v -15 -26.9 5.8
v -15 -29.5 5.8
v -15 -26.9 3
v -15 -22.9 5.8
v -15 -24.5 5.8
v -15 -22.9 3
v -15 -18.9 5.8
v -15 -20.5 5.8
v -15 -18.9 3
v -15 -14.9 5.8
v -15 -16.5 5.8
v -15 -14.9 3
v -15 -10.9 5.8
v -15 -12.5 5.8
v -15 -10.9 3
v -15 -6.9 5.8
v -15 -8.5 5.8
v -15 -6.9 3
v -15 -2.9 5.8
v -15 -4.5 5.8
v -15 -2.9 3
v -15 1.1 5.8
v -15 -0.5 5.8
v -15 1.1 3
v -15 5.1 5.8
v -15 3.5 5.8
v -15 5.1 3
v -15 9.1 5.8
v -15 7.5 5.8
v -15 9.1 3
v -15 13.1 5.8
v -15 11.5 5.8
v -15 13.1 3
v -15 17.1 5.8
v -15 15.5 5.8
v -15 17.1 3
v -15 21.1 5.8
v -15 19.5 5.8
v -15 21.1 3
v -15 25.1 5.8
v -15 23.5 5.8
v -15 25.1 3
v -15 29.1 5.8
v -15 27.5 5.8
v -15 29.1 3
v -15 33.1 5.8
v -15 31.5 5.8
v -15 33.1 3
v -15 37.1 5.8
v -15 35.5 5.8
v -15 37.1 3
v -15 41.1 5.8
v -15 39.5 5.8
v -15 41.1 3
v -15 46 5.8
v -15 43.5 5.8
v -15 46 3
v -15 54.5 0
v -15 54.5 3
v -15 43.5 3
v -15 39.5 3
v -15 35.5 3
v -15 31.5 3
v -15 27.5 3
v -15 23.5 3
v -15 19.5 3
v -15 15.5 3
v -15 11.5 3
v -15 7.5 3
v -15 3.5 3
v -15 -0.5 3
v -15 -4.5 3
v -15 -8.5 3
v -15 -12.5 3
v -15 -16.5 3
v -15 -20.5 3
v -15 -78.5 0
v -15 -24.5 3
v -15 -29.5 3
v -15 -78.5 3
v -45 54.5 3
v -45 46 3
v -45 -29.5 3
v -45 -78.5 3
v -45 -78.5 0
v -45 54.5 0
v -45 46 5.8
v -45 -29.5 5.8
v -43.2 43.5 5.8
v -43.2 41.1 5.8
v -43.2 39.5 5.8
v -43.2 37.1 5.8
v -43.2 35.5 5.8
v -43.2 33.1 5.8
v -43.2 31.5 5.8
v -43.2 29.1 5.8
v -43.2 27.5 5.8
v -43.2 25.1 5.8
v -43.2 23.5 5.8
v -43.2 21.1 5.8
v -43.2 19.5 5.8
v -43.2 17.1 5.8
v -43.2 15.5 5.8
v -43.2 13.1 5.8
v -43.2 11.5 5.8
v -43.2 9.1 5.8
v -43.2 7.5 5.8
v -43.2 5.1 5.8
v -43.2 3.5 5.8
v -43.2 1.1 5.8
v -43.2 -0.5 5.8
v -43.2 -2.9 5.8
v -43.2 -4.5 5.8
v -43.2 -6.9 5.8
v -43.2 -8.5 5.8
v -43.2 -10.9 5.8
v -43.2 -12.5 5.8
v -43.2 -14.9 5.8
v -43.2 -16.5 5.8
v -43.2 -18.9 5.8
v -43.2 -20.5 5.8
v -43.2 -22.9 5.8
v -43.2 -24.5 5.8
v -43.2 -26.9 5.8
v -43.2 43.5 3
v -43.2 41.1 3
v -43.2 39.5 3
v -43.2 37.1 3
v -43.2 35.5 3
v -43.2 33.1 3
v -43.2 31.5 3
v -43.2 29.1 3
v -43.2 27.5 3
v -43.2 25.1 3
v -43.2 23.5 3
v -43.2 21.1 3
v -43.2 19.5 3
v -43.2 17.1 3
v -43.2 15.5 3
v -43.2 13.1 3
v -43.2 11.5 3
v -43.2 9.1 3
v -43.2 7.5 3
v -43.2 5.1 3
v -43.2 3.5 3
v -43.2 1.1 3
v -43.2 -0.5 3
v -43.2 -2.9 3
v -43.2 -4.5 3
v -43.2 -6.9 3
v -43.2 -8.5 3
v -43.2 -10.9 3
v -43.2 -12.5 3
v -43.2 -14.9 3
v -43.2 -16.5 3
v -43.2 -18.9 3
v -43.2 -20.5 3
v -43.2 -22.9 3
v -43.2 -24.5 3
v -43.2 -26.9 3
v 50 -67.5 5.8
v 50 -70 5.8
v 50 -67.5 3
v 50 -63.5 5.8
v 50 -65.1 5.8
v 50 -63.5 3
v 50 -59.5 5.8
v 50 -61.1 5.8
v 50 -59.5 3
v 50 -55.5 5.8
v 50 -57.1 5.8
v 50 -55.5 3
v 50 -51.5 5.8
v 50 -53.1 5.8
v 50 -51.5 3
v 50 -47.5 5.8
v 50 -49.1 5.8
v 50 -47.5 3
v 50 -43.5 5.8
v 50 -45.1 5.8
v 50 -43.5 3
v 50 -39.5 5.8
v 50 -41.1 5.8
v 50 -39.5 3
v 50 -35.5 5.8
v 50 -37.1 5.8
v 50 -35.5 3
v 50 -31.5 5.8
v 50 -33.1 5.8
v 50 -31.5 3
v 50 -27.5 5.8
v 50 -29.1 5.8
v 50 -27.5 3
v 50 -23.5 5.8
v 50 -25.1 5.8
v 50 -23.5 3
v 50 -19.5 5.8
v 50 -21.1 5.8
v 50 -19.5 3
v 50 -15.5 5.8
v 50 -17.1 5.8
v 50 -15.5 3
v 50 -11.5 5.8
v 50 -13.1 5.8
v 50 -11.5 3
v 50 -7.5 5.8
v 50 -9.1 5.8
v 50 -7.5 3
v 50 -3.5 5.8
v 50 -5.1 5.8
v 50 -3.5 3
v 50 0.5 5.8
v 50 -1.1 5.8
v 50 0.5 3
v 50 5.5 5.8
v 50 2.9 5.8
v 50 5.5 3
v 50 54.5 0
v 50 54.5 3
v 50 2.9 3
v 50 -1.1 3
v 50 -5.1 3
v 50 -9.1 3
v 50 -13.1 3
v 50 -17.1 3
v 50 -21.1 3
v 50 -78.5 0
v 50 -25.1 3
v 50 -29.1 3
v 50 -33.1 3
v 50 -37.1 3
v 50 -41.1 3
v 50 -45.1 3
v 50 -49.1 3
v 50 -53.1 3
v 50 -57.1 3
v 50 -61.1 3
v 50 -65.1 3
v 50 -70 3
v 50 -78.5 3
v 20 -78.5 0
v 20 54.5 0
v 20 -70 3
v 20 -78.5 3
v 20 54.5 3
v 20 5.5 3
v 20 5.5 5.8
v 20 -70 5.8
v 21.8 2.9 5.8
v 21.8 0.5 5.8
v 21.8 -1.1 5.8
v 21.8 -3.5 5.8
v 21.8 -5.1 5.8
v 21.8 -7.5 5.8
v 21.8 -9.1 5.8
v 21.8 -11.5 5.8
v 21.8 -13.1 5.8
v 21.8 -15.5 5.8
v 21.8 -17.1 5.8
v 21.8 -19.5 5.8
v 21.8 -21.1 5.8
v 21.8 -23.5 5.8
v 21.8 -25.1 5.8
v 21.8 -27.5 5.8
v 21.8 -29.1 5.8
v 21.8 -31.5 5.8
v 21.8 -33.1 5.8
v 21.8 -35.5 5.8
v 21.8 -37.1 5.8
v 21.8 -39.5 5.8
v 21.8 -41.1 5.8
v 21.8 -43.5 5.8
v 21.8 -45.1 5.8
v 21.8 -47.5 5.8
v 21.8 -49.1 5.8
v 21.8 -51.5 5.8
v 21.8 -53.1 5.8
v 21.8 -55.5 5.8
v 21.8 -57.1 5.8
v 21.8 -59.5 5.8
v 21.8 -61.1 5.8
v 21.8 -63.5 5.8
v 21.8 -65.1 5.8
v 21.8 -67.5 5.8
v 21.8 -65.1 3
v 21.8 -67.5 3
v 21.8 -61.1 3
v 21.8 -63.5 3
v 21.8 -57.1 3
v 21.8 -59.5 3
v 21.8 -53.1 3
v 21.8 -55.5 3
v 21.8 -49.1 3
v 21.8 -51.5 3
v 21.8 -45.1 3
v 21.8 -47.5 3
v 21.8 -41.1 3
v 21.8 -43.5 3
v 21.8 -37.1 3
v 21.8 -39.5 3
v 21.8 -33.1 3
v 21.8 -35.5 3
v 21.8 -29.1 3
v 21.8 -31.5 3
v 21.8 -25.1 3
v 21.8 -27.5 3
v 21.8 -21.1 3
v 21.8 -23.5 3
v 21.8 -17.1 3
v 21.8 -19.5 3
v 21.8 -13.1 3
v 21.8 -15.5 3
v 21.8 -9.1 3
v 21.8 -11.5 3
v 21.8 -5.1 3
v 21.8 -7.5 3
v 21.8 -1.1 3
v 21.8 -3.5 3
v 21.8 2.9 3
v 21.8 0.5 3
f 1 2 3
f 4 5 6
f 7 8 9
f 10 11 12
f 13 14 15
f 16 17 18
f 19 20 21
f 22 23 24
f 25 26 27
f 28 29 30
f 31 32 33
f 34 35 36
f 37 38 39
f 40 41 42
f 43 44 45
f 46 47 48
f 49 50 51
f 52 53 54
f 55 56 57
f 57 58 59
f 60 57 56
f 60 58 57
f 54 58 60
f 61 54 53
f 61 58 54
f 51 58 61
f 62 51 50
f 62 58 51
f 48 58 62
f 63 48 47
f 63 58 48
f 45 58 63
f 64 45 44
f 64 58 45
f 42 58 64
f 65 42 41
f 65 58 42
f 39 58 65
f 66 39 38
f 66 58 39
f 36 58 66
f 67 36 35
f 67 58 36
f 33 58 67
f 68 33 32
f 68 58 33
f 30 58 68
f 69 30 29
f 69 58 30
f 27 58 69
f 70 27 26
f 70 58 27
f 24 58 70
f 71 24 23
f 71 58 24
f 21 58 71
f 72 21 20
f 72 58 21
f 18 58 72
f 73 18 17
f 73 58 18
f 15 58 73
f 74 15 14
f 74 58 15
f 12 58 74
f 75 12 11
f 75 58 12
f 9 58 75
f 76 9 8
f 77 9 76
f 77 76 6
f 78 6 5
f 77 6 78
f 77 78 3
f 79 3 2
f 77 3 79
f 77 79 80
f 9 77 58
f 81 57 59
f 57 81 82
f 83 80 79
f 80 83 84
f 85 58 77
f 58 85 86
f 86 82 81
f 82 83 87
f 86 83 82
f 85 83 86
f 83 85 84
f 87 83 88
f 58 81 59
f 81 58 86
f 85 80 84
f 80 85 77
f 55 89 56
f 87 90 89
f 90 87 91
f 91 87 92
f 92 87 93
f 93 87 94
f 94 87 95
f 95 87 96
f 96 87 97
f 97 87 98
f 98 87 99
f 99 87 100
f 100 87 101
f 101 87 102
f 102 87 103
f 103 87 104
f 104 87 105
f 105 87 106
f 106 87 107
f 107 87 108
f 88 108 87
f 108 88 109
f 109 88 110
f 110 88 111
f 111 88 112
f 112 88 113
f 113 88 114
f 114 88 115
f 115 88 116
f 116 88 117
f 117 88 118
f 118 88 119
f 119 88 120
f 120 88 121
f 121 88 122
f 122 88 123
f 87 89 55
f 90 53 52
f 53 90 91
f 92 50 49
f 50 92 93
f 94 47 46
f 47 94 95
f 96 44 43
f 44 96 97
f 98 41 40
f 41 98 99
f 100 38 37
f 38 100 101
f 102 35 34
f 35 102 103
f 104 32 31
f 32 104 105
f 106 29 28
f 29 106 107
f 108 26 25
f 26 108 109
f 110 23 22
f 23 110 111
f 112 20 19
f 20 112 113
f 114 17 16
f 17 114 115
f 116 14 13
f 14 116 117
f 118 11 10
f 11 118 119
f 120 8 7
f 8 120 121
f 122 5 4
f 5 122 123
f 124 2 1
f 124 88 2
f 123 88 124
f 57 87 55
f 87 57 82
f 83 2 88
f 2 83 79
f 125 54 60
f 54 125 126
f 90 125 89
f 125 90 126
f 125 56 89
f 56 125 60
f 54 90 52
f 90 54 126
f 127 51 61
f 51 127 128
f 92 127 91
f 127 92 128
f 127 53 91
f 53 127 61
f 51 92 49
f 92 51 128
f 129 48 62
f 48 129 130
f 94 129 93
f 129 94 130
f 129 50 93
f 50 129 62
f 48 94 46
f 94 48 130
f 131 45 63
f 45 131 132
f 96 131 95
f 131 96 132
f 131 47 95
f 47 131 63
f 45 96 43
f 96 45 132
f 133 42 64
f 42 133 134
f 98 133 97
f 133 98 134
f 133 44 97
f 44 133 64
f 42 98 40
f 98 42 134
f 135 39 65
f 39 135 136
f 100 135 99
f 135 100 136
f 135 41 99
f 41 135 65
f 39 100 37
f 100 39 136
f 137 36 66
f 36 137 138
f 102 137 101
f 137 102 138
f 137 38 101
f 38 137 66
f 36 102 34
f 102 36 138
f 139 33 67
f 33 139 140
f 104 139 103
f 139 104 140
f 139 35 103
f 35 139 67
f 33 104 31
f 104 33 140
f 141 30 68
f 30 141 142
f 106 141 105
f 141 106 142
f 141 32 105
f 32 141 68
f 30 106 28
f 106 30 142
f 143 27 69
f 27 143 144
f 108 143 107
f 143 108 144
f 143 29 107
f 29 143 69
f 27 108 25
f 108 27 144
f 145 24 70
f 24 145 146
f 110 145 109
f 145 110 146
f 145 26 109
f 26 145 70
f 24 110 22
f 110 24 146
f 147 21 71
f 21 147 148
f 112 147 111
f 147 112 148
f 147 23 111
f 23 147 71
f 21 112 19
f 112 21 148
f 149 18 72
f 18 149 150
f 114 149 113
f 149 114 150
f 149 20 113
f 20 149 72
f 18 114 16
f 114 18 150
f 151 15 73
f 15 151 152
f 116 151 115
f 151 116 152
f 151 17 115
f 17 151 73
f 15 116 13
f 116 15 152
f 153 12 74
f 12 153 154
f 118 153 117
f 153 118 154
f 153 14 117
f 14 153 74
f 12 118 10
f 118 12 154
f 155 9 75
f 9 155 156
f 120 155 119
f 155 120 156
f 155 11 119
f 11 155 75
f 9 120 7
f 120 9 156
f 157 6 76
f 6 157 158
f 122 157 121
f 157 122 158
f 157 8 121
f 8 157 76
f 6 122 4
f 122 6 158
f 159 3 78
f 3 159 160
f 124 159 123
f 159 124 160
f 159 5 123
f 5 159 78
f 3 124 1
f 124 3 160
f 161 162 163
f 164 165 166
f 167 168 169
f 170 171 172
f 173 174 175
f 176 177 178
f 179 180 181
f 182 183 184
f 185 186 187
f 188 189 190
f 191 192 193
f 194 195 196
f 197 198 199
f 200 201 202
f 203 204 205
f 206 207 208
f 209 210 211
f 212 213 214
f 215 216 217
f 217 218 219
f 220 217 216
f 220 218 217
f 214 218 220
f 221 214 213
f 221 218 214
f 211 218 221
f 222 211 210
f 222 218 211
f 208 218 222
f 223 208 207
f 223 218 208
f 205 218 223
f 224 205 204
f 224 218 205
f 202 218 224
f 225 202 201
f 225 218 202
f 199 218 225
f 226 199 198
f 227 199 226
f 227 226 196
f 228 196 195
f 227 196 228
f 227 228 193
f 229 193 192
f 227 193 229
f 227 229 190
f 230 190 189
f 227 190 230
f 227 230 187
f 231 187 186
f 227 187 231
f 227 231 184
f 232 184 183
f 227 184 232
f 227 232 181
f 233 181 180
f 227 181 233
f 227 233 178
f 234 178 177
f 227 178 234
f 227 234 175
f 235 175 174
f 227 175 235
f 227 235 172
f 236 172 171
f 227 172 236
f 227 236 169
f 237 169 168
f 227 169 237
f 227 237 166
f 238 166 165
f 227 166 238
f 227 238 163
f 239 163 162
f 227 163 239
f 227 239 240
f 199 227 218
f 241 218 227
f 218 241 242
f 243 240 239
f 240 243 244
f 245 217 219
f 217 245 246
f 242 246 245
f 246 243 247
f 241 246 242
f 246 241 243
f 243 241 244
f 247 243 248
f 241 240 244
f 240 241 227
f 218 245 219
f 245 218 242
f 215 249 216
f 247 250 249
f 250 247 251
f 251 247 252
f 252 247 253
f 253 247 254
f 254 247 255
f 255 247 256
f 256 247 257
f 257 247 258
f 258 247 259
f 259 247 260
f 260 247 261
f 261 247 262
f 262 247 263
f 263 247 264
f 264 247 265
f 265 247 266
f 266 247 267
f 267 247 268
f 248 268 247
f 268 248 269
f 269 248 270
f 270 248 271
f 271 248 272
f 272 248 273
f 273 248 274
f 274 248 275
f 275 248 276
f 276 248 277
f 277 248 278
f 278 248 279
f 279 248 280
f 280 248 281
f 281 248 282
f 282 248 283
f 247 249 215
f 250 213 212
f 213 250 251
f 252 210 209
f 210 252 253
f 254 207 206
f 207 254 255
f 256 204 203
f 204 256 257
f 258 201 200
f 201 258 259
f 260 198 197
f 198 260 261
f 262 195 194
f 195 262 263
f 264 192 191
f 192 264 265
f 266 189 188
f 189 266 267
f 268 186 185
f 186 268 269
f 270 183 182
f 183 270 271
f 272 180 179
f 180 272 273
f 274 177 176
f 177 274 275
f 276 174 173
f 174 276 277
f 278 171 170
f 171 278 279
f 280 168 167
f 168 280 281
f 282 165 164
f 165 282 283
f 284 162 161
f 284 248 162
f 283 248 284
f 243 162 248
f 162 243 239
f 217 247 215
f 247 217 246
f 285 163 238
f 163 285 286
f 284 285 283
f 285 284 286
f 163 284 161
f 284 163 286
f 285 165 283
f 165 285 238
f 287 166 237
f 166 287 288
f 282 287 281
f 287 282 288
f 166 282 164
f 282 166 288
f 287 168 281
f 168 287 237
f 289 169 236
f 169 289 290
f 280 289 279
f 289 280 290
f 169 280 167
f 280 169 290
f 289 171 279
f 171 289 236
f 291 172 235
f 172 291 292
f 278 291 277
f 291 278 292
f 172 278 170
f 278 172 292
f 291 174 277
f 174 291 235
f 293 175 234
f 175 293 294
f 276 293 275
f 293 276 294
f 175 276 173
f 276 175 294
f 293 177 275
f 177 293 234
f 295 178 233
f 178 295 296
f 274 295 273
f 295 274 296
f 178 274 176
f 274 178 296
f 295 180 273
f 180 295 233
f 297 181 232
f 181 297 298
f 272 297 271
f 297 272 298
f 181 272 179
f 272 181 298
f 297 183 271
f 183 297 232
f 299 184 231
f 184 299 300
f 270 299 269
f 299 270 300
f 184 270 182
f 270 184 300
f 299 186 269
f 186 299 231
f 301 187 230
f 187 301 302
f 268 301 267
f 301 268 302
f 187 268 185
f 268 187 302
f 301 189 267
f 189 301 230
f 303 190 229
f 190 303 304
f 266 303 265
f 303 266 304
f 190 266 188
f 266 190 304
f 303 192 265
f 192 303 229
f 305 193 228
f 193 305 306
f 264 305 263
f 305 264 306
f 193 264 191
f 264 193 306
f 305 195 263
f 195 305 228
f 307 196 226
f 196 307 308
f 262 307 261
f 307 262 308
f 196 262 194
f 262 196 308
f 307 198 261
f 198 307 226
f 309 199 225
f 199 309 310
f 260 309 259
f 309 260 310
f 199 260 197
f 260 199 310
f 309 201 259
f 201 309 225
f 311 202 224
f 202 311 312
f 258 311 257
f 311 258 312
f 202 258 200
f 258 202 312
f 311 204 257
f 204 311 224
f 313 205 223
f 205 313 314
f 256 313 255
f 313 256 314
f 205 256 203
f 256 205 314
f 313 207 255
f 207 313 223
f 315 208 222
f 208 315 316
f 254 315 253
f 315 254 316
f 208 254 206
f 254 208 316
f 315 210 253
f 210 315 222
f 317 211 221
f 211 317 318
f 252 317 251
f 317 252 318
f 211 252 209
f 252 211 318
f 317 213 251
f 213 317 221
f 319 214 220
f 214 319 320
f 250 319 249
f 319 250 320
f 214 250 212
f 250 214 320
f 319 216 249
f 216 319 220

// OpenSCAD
//!OpenSCAD
// Ball bearing spool holder for the Replicator1
// Written by Joe Cabana  1/2/2013
// You are free to use and/or modify this software for non-comercial
// uses as long as you retain this message. Thanks.

// Spool dimensions
SpoolCnt = 18;  // Number of spool sizes
SpoolWid = [97, 93, 89, 85, 81, 77, 73, 69, 65, 61, 57, 53, 49, 45, 41, 37, 33, 29];  // Width of filament spool the first one must be the biggest, and the last one the smallest.
SpoolSpace = 1;  // Extra space on each side of the spool

// Bearing mount dimensions
SplShdDia = 30;  // Diameter of spool guiding shoulder
SplShdThk = 2;  // Thickness of spool guiding shoulder

// Bracket dimensions
InBrkThk = 12;  // Thickness of bracket on back of replicator
OutBrkThk = 8;  // Thickness of bracket on outside
BrkWid = 100; // Width of bracket on back of replicator
InBrkHgt = 150;  // Height of bracket on back or replicator
OutBrkHgt = 30;  // Height of outside bracket
SlotDepth = 3; // Depth of slots to hold outer bracket
SlotWidth = 2; // Width of slots to hold outer bracket
SlotClear = .2;  // Clearance for outer bracket slots
ArmWid = (2 * SplShdThk) + (2 * OutBrkThk) + InBrkThk + SpoolWid[0] + SpoolSpace + SlotWidth + 1;  // Width of outer bracket arms
ArmThk = 3;  // Thickness of outer bracket arms

    // Outer bracket mounting arms
    translate([-OutBrkHgt*1.5,-(ArmWid/2+InBrkThk),0])
        Arm(0);
    translate([OutBrkHgt/2+5,ArmWid/2-InBrkThk,ArmThk])
        rotate([180,0,0])
            Arm(1);


// Routine to draw the outer bracket mounting arm
module Arm(Invert = 0)
{
    SlotBlockWid = SpoolWid[0]-SpoolWid[SpoolCnt-1]+(3*SlotWidth) + 1.5;  // Width of block to hold slots

    difference()
    {
        // Arm
        union()
        {
            cube([OutBrkHgt,ArmWid,ArmThk]);  // Arm
            if (Invert)
                translate([0,ArmWid-SlotBlockWid-OutBrkThk-.5,-(SlotDepth-SlotClear)])
                    cube([OutBrkHgt,SlotBlockWid,ArmThk+SlotDepth-SlotClear]);  // Outer bracket support
            else
                translate([0,ArmWid-SlotBlockWid-OutBrkThk-.5,0])
                    cube([OutBrkHgt,SlotBlockWid,ArmThk+SlotDepth-SlotClear]);  // Outer bracket support
        }

        // Outer bracket slots
        for (cnt = [0 : (SpoolCnt-1)])
            if (Invert)
                translate([SlotWidth-SlotClear,(2*SplShdThk)+OutBrkThk+InBrkThk+SpoolWid[cnt]+SpoolSpace-(SlotWidth+(2*SlotClear)),-(ArmThk+1)])
                    cube([OutBrkHgt,SlotWidth+(2*SlotClear),SlotDepth+1]);  // Outer bracket support
            else
                translate([SlotWidth-SlotClear,(2*SplShdThk)+OutBrkThk+InBrkThk+SpoolWid[cnt]+SpoolSpace-(SlotWidth+(2*SlotClear)),ArmThk])
                    cube([OutBrkHgt,SlotWidth+(2*SlotClear),SlotDepth+1]);  // Outer bracket support
    }
}
